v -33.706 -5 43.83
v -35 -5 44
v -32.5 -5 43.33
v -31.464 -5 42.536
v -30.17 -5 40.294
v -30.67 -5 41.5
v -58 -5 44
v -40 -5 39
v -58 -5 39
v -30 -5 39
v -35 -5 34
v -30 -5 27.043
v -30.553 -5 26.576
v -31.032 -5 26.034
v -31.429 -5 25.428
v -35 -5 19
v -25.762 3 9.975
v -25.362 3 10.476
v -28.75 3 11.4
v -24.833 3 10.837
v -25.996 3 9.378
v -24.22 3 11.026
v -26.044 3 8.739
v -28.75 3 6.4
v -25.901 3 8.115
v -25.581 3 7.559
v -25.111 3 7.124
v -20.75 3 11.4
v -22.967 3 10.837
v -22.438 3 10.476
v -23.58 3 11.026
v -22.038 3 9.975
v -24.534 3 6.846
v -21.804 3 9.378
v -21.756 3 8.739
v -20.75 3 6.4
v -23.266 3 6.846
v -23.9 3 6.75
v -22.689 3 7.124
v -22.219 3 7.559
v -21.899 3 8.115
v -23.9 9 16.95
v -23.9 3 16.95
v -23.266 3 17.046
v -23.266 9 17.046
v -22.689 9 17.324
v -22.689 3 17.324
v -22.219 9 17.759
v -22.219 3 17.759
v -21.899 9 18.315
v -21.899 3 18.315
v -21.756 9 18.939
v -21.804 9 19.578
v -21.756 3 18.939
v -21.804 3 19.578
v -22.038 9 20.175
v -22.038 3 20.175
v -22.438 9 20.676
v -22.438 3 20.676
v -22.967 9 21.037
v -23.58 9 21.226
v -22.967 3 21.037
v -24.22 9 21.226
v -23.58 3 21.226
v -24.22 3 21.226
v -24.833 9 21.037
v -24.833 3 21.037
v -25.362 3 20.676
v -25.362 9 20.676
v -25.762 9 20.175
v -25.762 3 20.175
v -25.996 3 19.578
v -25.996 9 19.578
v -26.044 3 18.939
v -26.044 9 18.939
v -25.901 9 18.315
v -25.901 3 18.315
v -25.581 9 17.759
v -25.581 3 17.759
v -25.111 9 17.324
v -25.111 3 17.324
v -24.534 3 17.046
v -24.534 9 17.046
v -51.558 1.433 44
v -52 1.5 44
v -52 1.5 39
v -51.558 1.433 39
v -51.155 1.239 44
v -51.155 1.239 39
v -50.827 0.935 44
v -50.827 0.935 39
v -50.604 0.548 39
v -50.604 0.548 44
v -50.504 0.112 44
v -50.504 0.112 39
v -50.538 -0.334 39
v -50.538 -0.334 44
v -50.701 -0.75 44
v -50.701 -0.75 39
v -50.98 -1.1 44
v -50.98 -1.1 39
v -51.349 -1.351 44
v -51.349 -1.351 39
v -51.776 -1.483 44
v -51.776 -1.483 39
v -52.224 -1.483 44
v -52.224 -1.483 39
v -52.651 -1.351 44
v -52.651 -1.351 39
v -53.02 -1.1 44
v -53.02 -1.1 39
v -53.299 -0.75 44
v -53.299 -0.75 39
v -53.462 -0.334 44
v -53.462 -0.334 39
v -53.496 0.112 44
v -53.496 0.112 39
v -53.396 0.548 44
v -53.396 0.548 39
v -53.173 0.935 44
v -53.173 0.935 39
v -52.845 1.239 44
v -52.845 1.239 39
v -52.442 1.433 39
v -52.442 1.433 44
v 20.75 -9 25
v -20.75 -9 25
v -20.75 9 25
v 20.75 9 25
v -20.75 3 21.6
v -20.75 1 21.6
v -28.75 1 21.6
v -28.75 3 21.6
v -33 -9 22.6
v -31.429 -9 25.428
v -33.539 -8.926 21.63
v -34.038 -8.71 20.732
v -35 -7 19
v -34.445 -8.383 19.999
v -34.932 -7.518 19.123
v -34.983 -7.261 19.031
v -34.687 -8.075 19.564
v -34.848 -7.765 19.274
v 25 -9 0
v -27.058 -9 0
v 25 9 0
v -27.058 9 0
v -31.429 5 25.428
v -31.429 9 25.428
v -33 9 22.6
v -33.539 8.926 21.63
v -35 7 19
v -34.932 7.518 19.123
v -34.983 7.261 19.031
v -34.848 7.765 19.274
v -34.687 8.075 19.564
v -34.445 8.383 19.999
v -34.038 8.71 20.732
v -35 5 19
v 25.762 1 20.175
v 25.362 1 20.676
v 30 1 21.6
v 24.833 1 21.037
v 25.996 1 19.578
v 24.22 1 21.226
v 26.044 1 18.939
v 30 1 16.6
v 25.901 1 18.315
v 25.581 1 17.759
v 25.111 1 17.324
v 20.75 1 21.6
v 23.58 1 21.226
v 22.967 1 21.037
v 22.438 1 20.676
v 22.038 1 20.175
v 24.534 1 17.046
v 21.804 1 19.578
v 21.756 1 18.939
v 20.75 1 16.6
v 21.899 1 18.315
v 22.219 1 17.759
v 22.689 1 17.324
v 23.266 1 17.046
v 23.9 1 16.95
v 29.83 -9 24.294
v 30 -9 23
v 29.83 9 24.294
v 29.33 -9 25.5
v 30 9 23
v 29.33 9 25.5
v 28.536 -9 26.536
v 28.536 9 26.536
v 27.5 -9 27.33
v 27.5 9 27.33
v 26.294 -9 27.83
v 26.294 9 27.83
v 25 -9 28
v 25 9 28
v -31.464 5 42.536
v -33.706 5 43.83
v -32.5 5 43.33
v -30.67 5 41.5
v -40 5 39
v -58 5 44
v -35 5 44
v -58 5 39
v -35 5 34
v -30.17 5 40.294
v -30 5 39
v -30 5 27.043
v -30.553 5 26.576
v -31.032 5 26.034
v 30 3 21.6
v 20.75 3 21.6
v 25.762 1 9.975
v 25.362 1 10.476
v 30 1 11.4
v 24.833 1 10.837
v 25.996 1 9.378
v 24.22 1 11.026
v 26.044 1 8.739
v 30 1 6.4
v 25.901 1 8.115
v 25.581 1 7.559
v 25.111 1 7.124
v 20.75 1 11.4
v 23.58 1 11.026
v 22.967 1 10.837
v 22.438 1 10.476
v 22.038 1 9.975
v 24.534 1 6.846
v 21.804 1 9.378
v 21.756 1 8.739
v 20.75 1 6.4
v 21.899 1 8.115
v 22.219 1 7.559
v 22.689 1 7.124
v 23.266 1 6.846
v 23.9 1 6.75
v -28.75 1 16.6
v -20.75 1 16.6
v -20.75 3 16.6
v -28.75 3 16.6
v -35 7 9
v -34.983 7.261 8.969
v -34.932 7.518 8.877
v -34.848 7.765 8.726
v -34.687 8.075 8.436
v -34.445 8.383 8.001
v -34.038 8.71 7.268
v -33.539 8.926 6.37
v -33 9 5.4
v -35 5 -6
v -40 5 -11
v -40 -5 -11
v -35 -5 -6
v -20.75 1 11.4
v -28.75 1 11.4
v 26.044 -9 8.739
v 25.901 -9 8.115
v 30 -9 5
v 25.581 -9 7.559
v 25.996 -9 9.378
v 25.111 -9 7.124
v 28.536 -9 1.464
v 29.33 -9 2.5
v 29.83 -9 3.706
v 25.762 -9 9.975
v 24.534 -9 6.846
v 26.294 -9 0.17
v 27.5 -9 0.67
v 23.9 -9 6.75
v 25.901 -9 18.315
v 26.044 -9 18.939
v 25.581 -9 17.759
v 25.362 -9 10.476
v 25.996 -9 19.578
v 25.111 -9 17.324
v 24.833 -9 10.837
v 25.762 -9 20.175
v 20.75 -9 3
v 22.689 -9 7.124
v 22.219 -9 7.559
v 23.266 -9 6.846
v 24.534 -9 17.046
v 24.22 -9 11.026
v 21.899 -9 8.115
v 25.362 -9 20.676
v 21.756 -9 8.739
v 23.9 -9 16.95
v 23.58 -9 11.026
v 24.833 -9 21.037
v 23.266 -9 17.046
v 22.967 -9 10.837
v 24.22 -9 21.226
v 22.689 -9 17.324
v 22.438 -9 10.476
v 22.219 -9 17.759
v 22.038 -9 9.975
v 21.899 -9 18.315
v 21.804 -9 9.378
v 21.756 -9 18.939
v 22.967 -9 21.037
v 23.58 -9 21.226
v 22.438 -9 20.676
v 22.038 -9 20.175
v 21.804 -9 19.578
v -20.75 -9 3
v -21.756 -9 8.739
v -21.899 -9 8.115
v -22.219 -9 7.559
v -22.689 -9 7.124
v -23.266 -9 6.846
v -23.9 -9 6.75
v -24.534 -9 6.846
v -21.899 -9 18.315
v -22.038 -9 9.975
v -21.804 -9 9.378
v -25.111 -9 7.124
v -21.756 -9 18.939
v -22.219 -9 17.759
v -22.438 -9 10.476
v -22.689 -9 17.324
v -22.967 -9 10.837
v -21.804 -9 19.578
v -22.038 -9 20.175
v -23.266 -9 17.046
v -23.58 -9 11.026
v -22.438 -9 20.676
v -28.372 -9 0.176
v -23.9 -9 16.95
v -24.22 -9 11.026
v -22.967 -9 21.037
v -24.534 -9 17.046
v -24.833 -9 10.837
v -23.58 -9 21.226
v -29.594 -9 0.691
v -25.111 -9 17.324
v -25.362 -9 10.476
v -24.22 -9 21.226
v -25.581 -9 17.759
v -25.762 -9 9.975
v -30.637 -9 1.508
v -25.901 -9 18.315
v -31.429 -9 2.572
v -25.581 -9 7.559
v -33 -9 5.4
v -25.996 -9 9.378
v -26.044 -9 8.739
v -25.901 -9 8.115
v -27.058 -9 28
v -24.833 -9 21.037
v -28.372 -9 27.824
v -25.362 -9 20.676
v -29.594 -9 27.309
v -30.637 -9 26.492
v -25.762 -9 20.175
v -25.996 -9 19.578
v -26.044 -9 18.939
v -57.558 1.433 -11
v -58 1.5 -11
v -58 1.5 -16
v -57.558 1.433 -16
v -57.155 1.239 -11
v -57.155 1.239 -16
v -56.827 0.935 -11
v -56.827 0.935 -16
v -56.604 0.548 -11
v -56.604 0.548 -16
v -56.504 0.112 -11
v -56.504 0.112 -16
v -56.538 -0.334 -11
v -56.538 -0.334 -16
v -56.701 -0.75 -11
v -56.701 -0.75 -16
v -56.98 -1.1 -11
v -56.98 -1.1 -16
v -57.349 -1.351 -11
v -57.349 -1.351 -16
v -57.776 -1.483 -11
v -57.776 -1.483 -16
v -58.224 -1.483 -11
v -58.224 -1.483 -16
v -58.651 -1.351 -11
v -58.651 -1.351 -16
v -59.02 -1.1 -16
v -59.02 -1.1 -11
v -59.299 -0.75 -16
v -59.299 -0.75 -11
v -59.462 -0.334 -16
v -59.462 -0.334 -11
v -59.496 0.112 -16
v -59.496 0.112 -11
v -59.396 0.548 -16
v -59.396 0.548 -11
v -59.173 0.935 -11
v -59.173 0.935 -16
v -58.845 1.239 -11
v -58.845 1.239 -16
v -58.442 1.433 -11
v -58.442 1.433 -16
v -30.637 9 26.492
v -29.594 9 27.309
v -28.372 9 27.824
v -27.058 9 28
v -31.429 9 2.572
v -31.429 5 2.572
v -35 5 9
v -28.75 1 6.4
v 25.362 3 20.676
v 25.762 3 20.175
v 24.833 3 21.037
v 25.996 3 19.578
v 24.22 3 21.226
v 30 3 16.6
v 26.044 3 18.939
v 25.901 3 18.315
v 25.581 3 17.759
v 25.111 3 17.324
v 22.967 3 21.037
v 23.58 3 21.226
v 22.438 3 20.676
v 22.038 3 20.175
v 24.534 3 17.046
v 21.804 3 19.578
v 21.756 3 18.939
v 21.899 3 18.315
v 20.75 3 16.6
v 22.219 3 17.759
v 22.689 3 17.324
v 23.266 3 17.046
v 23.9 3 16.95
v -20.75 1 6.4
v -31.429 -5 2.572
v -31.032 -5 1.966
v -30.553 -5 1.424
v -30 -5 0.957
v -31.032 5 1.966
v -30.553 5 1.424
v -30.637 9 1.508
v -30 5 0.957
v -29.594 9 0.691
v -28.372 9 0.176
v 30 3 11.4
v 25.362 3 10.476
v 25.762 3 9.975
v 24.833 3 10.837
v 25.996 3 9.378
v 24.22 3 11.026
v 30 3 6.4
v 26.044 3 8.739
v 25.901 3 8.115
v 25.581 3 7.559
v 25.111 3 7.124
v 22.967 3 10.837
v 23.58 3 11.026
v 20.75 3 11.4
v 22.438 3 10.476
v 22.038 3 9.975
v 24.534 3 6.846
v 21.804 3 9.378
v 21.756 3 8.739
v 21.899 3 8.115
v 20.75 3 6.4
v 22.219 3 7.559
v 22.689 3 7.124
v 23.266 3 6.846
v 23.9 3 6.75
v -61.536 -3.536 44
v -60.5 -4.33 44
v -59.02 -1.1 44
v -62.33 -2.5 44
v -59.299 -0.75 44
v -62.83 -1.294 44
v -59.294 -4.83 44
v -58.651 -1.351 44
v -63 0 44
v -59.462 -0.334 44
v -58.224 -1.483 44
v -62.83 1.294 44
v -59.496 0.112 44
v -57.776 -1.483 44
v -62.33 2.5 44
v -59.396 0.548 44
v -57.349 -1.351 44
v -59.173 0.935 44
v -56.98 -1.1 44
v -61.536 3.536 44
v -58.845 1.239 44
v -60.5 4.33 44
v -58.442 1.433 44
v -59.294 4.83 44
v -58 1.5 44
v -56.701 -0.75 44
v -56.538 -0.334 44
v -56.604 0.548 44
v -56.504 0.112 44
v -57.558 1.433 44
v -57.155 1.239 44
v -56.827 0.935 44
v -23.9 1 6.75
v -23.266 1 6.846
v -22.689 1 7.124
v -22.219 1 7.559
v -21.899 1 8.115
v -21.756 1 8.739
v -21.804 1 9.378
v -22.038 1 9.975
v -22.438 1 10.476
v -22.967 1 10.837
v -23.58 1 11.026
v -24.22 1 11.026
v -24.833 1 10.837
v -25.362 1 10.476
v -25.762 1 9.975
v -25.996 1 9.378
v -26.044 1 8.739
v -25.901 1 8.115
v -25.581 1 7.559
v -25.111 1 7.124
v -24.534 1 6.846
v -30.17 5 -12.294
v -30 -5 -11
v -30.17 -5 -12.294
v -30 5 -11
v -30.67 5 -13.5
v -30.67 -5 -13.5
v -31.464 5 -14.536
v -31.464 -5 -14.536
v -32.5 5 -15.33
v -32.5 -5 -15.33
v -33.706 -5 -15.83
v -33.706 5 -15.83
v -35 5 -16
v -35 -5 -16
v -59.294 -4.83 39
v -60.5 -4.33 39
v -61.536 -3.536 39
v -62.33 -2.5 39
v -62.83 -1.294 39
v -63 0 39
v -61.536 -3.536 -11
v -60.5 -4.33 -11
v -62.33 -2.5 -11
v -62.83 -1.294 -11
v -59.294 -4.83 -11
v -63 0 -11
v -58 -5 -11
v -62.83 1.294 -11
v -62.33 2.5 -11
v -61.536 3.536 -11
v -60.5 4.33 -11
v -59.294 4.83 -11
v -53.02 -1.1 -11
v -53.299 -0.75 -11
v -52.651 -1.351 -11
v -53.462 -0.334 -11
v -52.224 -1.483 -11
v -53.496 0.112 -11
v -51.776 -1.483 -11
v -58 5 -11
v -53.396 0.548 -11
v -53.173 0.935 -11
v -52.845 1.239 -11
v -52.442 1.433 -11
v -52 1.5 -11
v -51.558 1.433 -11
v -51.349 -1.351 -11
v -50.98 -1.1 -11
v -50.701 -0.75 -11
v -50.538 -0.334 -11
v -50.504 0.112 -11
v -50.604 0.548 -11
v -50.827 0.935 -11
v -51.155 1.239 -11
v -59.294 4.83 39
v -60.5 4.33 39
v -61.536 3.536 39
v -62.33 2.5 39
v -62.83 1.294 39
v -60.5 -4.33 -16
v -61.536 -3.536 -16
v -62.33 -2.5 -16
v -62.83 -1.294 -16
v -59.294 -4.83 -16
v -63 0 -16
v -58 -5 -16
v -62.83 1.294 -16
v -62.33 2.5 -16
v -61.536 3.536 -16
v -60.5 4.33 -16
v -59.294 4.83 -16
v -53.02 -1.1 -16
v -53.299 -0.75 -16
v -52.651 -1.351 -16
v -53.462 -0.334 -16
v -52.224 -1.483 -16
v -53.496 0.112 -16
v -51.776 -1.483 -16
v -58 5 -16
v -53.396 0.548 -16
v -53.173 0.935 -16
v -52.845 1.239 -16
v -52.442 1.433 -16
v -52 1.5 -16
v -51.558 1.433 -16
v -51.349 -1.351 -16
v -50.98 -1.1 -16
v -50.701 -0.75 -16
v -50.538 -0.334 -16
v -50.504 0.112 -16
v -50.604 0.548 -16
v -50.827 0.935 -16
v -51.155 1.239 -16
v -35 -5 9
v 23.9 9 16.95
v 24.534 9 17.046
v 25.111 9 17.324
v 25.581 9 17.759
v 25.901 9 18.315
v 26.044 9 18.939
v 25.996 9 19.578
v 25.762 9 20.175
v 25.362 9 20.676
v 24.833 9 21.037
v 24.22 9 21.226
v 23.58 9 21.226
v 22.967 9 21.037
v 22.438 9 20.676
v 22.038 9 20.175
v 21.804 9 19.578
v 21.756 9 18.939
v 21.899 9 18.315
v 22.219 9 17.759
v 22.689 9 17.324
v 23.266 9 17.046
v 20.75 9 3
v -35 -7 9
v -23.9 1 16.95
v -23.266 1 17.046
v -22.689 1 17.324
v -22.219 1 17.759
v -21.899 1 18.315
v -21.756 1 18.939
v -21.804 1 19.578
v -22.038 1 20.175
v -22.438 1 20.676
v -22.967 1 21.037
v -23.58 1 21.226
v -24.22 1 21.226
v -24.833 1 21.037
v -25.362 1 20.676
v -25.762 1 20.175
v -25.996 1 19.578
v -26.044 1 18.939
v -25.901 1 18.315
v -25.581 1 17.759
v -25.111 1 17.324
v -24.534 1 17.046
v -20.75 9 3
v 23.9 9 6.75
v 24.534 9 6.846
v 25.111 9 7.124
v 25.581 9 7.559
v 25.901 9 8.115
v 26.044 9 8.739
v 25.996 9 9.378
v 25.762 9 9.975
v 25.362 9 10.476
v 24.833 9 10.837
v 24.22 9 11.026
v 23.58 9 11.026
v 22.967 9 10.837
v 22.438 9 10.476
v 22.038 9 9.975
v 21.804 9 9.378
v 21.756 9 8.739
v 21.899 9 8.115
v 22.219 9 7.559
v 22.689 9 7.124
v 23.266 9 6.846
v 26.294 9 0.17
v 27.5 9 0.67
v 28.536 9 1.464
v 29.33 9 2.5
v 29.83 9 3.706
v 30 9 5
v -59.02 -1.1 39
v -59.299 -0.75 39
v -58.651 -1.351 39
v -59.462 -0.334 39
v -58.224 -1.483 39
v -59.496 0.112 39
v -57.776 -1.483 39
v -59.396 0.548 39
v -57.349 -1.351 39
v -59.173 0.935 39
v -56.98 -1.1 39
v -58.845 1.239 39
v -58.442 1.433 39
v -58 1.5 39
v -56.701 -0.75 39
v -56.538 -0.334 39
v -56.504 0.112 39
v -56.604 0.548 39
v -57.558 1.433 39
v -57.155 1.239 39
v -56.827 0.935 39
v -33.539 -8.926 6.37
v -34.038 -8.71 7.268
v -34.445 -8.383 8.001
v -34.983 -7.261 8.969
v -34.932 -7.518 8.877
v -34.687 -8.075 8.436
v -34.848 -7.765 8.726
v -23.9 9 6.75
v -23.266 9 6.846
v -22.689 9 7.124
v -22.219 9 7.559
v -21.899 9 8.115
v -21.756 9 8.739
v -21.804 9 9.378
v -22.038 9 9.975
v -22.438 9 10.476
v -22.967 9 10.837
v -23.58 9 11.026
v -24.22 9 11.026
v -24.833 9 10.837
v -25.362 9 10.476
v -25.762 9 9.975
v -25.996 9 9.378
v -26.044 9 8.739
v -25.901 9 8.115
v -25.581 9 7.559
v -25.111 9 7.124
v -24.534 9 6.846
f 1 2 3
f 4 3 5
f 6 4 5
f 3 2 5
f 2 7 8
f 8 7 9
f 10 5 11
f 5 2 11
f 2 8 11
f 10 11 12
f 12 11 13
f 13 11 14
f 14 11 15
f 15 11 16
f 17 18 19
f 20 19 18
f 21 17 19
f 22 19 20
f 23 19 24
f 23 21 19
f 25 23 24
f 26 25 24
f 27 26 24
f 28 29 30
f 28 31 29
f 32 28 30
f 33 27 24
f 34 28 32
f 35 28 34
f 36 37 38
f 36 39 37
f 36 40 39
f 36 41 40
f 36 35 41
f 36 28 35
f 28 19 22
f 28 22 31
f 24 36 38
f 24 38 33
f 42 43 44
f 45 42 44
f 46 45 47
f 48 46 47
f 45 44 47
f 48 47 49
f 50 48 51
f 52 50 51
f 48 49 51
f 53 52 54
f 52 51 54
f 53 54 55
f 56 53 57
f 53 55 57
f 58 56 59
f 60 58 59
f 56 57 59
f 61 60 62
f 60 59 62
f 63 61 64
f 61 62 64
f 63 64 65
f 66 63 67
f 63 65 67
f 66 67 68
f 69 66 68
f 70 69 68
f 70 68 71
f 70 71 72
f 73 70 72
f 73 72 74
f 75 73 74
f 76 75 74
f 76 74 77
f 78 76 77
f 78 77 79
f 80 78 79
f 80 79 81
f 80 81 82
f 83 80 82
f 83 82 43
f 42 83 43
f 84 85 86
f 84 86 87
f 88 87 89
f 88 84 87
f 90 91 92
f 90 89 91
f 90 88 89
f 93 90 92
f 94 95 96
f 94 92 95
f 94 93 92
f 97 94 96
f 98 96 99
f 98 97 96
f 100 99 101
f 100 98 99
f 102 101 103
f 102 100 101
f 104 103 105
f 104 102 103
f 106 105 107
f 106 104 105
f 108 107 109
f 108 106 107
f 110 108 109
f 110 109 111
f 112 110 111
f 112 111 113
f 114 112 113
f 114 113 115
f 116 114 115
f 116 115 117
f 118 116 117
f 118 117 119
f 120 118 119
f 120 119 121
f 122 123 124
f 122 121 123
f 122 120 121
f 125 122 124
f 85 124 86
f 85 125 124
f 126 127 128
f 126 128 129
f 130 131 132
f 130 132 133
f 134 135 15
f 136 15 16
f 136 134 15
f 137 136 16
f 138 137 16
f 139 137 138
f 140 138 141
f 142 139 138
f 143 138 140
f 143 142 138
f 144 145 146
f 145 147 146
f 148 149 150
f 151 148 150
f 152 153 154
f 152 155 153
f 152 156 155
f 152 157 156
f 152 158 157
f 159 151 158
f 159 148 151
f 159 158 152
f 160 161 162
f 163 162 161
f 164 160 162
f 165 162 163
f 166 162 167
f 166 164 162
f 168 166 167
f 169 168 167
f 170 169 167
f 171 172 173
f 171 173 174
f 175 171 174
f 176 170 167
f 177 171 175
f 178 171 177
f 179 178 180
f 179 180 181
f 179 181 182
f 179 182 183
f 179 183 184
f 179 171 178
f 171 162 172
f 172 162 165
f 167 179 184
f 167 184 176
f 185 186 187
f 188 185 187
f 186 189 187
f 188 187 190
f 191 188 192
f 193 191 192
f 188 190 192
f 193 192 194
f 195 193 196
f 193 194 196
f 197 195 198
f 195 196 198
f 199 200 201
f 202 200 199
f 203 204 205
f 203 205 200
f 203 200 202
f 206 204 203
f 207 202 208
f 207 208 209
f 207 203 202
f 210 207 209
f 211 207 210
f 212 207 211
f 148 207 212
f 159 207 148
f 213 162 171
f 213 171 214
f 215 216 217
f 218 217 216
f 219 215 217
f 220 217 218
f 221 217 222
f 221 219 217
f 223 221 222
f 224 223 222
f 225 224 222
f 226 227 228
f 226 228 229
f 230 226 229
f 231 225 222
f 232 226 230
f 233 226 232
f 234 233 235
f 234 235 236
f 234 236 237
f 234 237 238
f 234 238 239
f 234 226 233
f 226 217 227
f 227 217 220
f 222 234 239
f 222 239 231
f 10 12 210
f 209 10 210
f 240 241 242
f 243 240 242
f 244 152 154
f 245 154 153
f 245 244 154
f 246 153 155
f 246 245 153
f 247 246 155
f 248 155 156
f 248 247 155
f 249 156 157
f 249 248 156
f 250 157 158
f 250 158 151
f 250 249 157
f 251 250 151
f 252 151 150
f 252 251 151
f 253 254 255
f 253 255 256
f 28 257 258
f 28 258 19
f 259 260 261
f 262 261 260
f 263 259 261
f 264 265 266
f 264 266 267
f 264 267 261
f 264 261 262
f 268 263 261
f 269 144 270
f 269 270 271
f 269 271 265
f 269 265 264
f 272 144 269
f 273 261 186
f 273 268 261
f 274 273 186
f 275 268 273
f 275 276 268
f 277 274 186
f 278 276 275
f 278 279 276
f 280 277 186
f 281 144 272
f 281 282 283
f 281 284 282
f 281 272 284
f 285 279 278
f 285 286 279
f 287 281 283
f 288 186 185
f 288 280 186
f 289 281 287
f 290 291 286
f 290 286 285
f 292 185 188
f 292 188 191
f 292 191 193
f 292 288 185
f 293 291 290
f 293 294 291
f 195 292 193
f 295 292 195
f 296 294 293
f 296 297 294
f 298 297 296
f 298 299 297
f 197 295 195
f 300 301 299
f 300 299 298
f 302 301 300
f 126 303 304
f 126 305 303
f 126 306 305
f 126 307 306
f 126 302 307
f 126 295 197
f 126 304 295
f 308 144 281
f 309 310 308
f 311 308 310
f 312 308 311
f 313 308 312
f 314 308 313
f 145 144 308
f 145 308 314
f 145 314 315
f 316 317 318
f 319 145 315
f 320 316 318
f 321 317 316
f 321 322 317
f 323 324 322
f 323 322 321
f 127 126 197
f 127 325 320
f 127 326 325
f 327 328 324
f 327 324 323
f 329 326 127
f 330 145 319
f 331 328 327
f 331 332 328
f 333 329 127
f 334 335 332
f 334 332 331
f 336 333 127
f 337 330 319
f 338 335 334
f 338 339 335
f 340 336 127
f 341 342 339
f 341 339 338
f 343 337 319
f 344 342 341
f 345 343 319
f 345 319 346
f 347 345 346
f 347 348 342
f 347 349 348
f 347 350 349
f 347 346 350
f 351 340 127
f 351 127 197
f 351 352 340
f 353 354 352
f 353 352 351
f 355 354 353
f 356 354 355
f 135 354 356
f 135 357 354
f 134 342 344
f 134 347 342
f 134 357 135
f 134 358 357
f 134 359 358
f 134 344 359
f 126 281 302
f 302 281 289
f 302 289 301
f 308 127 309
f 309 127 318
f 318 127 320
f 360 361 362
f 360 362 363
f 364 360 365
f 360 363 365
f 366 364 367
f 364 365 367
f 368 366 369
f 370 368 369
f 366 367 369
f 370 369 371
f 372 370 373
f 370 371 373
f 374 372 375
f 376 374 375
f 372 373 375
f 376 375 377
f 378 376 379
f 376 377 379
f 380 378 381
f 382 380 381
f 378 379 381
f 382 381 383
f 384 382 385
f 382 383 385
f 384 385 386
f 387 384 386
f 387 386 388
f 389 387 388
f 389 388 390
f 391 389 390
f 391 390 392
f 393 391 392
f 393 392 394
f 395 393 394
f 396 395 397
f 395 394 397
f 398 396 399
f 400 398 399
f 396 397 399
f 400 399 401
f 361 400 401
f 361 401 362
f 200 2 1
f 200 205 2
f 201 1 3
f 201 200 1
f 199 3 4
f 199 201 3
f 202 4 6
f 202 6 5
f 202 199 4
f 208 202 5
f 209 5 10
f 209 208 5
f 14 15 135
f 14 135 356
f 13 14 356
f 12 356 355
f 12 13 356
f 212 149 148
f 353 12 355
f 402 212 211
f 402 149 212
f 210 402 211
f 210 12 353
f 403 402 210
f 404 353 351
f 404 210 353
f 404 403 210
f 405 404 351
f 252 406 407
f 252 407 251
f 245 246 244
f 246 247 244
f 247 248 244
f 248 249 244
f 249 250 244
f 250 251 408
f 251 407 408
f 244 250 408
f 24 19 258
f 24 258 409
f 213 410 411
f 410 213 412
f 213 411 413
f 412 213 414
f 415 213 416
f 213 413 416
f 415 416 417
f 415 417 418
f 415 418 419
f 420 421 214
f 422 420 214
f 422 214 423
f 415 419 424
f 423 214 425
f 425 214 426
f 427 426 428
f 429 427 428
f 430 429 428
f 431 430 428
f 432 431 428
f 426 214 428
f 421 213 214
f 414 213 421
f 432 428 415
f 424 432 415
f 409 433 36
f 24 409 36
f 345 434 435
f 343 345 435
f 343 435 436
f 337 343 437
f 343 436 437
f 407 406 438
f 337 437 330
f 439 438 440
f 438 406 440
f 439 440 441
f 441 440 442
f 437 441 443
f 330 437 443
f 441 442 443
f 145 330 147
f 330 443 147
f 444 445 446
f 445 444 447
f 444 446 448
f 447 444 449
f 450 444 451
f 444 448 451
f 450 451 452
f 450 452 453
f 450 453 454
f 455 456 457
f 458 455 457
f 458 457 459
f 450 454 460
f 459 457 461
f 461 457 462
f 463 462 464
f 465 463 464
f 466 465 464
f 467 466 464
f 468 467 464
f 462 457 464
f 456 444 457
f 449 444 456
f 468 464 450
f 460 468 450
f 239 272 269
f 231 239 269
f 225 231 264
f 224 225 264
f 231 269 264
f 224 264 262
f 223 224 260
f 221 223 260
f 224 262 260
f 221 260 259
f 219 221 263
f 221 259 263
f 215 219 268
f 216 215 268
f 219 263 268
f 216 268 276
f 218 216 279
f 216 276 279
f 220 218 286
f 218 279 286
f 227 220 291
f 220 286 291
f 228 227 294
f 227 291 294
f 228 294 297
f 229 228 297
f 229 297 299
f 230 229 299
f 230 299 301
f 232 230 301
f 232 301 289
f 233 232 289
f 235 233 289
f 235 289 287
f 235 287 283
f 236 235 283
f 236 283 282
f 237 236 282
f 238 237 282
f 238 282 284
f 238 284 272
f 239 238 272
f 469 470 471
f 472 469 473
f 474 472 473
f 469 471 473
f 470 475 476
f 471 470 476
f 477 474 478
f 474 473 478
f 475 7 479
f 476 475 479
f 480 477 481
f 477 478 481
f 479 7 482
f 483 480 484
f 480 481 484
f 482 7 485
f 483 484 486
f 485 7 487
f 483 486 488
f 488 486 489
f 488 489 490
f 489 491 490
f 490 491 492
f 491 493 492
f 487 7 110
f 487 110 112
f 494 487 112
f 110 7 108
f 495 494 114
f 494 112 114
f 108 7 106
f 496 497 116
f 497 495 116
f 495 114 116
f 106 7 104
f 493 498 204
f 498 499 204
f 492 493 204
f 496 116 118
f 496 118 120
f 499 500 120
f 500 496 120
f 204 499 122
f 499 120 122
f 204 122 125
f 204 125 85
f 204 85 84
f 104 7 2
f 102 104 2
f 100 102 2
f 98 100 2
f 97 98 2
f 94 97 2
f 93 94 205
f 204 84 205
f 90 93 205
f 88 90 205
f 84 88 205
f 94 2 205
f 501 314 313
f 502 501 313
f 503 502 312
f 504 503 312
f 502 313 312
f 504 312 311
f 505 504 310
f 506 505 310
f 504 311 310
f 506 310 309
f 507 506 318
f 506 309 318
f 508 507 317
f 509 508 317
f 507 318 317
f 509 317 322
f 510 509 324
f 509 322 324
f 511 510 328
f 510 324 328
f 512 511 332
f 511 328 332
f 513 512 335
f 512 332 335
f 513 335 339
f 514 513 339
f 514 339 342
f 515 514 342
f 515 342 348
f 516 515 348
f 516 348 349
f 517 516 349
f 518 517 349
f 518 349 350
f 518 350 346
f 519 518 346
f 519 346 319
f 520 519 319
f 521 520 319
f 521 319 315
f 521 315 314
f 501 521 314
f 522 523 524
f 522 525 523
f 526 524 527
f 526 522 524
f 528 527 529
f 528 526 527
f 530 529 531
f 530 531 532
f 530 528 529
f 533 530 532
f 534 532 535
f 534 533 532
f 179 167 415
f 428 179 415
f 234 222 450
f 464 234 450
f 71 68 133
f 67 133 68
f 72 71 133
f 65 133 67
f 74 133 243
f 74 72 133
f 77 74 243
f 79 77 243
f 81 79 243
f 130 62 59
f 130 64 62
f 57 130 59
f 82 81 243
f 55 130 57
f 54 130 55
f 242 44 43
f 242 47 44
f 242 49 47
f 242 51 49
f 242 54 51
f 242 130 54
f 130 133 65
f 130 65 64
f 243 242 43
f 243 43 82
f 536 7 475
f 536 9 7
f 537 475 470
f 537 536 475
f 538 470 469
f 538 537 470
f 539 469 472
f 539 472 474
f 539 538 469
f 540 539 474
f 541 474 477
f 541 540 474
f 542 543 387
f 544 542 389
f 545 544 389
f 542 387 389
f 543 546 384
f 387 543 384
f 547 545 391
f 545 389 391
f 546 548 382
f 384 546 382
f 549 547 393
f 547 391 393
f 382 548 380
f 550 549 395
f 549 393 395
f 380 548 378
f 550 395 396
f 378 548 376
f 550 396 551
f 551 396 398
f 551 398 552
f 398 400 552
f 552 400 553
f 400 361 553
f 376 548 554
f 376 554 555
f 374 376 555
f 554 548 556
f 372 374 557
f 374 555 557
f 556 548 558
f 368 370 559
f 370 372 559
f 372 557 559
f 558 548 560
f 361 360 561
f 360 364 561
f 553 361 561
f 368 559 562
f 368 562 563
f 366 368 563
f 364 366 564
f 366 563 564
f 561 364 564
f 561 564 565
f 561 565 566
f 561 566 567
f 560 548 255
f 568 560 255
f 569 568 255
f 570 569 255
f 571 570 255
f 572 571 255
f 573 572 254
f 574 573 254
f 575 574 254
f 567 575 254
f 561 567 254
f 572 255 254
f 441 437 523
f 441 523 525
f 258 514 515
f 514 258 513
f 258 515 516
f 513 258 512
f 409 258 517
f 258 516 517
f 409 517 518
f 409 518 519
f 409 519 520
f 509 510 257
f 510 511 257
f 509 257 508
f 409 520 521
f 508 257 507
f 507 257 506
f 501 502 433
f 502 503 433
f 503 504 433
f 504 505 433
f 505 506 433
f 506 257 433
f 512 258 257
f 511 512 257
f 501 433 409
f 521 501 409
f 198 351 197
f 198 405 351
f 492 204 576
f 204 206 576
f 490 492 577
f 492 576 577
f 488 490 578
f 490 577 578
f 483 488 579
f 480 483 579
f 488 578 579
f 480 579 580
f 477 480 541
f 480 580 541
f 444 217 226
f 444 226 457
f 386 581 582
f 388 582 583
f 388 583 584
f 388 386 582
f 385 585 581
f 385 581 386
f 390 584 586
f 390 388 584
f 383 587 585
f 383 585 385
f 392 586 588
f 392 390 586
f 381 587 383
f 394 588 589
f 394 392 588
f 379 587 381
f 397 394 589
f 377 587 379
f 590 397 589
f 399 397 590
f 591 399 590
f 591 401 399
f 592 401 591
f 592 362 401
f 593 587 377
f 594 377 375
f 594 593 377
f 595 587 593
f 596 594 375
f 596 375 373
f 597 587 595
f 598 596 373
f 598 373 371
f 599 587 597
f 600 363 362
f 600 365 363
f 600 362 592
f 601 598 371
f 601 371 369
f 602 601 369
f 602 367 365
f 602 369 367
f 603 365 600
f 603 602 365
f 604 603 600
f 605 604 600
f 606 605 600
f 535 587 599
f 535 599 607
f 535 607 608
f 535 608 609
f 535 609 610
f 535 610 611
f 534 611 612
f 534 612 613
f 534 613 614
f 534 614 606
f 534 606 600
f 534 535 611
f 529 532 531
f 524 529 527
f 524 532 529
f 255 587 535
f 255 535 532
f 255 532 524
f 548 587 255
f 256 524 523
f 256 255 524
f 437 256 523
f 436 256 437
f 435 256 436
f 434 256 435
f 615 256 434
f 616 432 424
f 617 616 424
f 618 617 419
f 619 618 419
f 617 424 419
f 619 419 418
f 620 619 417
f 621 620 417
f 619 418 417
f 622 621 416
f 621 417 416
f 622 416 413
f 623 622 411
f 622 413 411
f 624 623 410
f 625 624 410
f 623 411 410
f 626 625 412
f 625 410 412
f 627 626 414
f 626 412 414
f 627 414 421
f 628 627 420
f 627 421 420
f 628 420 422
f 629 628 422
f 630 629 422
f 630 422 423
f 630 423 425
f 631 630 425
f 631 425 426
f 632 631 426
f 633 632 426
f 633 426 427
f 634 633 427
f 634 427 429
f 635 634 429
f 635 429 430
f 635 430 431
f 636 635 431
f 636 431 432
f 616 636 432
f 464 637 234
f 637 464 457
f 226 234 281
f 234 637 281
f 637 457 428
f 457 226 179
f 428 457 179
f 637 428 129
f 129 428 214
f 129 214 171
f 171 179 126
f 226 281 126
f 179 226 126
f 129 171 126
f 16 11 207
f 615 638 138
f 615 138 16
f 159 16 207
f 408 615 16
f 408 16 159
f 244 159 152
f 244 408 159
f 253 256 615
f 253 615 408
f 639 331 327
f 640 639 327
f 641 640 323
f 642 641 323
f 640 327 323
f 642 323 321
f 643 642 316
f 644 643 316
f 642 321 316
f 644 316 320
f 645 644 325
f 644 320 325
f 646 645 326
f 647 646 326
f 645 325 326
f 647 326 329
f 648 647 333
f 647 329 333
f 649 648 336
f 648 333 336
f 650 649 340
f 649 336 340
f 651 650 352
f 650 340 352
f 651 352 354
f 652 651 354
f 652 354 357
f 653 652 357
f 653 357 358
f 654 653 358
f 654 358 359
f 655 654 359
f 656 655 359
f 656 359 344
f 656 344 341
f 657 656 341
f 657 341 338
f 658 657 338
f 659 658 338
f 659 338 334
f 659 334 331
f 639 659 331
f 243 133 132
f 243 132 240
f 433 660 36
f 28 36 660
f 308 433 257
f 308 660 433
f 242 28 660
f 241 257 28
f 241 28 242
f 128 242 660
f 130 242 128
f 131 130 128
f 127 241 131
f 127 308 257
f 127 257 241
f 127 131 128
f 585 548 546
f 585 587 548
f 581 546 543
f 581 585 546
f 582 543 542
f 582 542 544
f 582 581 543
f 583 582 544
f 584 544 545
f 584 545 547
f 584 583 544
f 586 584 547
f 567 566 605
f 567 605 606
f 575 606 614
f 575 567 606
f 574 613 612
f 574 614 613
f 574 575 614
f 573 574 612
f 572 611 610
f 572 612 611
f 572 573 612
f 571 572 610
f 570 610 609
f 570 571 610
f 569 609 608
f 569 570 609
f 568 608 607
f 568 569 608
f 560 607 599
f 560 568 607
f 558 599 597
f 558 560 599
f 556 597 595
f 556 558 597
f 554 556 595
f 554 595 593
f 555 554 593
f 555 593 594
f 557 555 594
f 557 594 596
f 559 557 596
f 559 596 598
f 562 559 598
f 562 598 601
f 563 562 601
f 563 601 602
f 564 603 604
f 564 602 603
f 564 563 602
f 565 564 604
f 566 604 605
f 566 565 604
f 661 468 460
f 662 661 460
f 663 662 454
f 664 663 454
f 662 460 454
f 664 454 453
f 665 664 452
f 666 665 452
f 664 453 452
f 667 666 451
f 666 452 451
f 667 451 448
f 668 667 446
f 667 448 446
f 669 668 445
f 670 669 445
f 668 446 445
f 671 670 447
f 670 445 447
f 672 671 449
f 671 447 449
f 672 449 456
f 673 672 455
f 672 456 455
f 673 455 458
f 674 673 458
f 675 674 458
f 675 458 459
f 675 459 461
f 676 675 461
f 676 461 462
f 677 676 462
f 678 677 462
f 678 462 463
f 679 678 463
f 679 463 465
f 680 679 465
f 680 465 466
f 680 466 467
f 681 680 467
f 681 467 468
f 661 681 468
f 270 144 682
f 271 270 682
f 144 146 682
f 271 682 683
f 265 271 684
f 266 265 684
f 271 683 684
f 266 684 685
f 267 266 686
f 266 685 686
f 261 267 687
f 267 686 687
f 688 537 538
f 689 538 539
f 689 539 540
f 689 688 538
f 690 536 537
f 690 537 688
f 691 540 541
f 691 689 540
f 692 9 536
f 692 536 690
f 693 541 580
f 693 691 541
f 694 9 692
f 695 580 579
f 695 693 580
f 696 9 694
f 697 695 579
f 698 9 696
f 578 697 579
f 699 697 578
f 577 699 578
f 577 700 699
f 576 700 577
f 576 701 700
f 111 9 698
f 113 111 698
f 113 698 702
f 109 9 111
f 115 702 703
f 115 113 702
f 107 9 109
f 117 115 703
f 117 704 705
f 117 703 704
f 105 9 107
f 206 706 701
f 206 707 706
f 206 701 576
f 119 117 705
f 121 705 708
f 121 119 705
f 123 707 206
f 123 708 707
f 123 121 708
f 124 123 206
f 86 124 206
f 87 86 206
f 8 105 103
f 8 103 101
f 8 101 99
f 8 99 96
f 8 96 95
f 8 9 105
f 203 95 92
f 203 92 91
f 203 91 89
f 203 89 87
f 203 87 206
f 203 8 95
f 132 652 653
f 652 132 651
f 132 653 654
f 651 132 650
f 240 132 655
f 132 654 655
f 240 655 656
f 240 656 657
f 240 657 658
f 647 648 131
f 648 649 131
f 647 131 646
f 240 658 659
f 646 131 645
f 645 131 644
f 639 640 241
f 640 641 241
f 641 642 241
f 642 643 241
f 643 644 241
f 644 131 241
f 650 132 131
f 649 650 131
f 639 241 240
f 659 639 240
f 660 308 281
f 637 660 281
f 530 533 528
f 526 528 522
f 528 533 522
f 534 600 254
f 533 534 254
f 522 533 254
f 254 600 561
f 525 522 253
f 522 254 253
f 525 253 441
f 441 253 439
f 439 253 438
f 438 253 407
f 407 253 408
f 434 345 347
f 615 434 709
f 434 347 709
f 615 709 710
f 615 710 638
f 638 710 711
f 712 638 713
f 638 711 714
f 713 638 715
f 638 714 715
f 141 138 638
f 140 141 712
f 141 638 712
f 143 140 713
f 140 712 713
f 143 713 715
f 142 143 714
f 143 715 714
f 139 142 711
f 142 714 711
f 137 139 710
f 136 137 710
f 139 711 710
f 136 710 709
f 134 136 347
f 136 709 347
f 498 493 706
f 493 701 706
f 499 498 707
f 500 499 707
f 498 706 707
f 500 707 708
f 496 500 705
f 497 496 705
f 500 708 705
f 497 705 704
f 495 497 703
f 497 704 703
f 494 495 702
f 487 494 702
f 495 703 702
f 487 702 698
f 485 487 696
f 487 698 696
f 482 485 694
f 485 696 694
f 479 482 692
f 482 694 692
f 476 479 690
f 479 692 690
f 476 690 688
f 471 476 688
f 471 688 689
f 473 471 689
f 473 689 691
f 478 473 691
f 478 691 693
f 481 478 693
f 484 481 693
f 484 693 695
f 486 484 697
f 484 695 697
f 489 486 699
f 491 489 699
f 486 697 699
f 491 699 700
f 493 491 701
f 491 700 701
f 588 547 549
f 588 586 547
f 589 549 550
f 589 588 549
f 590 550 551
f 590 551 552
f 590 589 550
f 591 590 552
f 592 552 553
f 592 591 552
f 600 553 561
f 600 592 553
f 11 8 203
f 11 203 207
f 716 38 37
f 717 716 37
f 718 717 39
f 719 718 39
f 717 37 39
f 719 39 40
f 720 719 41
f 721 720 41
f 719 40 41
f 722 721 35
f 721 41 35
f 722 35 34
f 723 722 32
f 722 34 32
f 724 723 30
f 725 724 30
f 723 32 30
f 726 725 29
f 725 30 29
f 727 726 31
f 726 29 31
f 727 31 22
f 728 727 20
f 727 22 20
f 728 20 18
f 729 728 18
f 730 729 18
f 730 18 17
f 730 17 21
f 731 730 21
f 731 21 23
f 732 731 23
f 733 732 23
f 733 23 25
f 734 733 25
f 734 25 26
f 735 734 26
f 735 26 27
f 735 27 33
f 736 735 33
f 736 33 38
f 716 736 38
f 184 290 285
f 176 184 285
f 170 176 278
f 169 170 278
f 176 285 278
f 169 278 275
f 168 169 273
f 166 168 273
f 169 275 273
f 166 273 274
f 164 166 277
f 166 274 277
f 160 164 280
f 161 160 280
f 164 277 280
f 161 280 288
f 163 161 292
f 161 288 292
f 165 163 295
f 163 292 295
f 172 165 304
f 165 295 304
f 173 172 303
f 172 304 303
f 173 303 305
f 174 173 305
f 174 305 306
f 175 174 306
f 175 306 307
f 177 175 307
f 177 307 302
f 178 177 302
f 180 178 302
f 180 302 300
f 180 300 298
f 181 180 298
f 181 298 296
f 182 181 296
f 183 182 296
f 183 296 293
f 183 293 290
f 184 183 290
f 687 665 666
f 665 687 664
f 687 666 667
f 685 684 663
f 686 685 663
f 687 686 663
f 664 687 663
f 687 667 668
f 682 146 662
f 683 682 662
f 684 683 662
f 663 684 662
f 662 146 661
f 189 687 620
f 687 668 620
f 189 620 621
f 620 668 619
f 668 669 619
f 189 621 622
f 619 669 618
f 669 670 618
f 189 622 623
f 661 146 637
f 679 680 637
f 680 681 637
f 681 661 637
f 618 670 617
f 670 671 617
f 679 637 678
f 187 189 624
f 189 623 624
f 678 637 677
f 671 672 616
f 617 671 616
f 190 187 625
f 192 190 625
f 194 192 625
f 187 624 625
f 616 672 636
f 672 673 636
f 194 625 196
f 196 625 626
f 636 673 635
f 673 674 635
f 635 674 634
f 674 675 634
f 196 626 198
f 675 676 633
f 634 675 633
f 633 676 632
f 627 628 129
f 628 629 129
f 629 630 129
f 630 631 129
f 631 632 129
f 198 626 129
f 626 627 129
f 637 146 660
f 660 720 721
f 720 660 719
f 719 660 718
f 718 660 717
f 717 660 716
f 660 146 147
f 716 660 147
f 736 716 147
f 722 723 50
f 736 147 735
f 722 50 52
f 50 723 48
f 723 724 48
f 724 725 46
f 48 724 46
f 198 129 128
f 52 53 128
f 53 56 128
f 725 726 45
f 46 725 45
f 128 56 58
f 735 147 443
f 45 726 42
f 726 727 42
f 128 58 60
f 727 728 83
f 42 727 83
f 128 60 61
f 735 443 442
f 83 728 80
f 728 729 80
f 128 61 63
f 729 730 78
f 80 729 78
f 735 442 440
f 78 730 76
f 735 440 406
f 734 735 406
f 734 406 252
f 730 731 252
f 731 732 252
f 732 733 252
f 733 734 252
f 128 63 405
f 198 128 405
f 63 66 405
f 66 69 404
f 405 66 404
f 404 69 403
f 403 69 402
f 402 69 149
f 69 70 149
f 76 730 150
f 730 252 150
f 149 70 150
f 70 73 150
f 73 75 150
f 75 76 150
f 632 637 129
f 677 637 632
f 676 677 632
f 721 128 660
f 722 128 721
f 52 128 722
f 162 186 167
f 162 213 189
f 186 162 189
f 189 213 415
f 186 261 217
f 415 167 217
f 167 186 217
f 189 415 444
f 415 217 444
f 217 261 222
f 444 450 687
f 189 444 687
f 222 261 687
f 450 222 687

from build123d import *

# Parameters (mm, degrees)
ESQUISSE1_W                         = 60
ESQUISSE1_H                         = 18
BOSS_EXTRU_1_DEPTH                  = 28
ESQUISSE2_W                         = 41.5
ESQUISSE2_H                         = 22
ENL_V_MAT_EXTRU_1_DEPTH             = 30
ESQUISSE3_R                         = 2.15
ENL_V_MAT_EXTRU_2_DEPTH             = 30
ESQUISSE5_W                         = 10
ESQUISSE5_H                         = 60
BOSS_EXTRU_2_DEPTH                  = 5
ESQUISSE6_W                         = 10
ESQUISSE6_H                         = 5
BOSS_EXTRU_3_DEPTH                  = 28
ESQUISSE7_R                         = 1.5
ENL_V_MAT_EXTRU_4_DEPTH             = 92.394748208
NERVURE11_REACH                     = 77.186
ESQUISSE8_WALL_W                    = 162.668500034
ESQUISSE8_WALL_H                    = 18
CONG_5_R                            = 5
CONG_6_R                            = 5
NERVURE12_REACH                     = 73.169
ESQUISSE10_WALL_W                   = 151.408694602
ESQUISSE10_WALL_H                   = 10
CONG_7_R                            = 5
ESQUISSE12_W                        = 5
ESQUISSE12_H                        = 2
ENL_V_MAT_EXTRU_5_DEPTH             = 8
ENL_V_MAT_EXTRU_5_DIRECTION_2_REACH = 67.265
R_P_TITION_CIRCULAIRE1_COUNT        = 3
R_P_TITION_CIRCULAIRE1_ANGLE        = 180
ENL_V_MAT_EXTRU_8_DEPTH             = 79.064076245
ENL_V_MAT_EXTRU_8_DEPTH_BACK        = 79.064076245
CONG_8_R                            = 5
CONG_10_R                           = 5
CONG_12_R                           = 2
NERVURE13_REACH                     = 79.369
ESQUISSE22_WALL_W                   = 163.809556882
ESQUISSE22_WALL_H                   = 10
ENL_V_MAT_EXTRU_10_DEPTH            = 88.464278423
ENL_V_MAT_EXTRU_10_DEPTH_BACK       = 88.464278423
ESQUISSE24_R                        = 1.5


with BuildPart() as part:
    # Esquisse1 → Boss.-Extru.1 (new body)
    with BuildSketch(Plane.XY):
        Rectangle(ESQUISSE1_W, ESQUISSE1_H)
    extrude(amount=BOSS_EXTRU_1_DEPTH)

    # Esquisse2 → Enlèv. mat.-Extru.1 (cut)
    with BuildSketch(Plane.XZ.offset(9)):
        with Locations((0, 14)):
            Rectangle(ESQUISSE2_W, ESQUISSE2_H)
    extrude(amount=-ENL_V_MAT_EXTRU_1_DEPTH, mode=Mode.SUBTRACT)

    # Esquisse3 → Enlèv. mat.-Extru.2 (cut)
    with BuildSketch(Plane(origin=(0, -9, 0), x_dir=(-1, 0, 0), z_dir=(0, -1, 0))):
        with Locations(Location((23.9, -19.1, 0), (0, 0, 90))):
            Circle(ESQUISSE3_R)
        with Locations(Location((23.9, -8.9, 0), (0, 0, 90))):
            Circle(ESQUISSE3_R)
        with Locations(Location((-23.9, -8.9, 0), (0, 0, 90))):
            Circle(ESQUISSE3_R)
        with Locations(Location((-23.9, -19.1, 0), (0, 0, 90))):
            Circle(ESQUISSE3_R)
    extrude(amount=-ENL_V_MAT_EXTRU_2_DEPTH, mode=Mode.SUBTRACT)

    # Esquisse5 → Boss.-Extru.2 (add)
    with BuildSketch(Plane.ZY.offset(30)):
        with Locations((14, 0)):
            Rectangle(ESQUISSE5_W, ESQUISSE5_H)
    boss_extru_2 = extrude(amount=BOSS_EXTRU_2_DEPTH)

    # Esquisse6 → Boss.-Extru.3 (add)
    with BuildSketch(Plane.ZY.offset(35)):
        with Locations((14, 27.5)):
            Rectangle(ESQUISSE6_W, ESQUISSE6_H)
        with Locations((14, -27.5)):
            Rectangle(ESQUISSE6_W, ESQUISSE6_H)
    boss_extru_3 = extrude(amount=BOSS_EXTRU_3_DEPTH)

    # Esquisse7 → Enlèv. mat.-Extru.4 (cut, symmetric)
    with BuildSketch(Plane(origin=(0, 30, 0), x_dir=(1, 0, 0), z_dir=(0, 1, 0))):
        with Locations(Location((-58, -14, 0), (0, 0, 270))):
            Circle(ESQUISSE7_R)
    enl_v_mat_extru_4 = extrude(amount=ENL_V_MAT_EXTRU_4_DEPTH, both=True, mode=Mode.SUBTRACT)

    # Esquisse8 wall → Nervure11 (add, up to next)
    with BuildSketch(Plane(origin=(-32.5, 0, 23.5), x_dir=(-0.485642931179, 0, -0.874157276122), z_dir=(-0.874157276122, 0, 0.485642931179)), mode=Mode.PRIVATE) as nervure11_sk1:
        Rectangle(ESQUISSE8_WALL_W, ESQUISSE8_WALL_H)
    nervure11_tool1 = extrude(nervure11_sk1.sketch, amount=-NERVURE11_REACH, mode=Mode.PRIVATE) - part.part
    nervure11 = nervure11_tool1.solids().sort_by_distance((-32.5, 0, 23.5))[0]
    add(nervure11)

    # Symétrie1: Nervure11 across plane
    add(nervure11.mirror(Plane.XY.offset(14)))

    # Congé5
    cong_5_edges = [part.edges().sort_by_distance(p)[0] for p in [
        (-30, 0, 28),
        (30, 0, 28),
        (-30, 0, 0),
        (30, 0, 0),
    ]]
    fillet(cong_5_edges, radius=CONG_5_R)

    # Congé6
    cong_6_edges = [part.edges().sort_by_distance(p)[0] for p in [
        (-30, 30, 14),
        (-30, -30, 14),
    ]]
    fillet(cong_6_edges, radius=CONG_6_R)

    # Esquisse10 wall → Nervure12 (add, up to next)
    with BuildSketch(Plane(origin=(-37.5, 22.5, 14), x_dir=(0.707106781187, -0.707106781187, 0), z_dir=(0.707106781187, 0.707106781187, 0)), mode=Mode.PRIVATE) as nervure12_sk1:
        Rectangle(ESQUISSE10_WALL_W, ESQUISSE10_WALL_H)
    nervure12_tool1 = extrude(nervure12_sk1.sketch, amount=NERVURE12_REACH, mode=Mode.PRIVATE) - part.part
    nervure12 = nervure12_tool1.solids().sort_by_distance((-37.5, 22.5, 14))[0]
    add(nervure12)

    # Symétrie2: Nervure12 across plane
    add(nervure12.mirror(Plane.ZX))

    # Congé7
    cong_7_edges = [part.edges().sort_by_distance(p)[0] for p in [
        (-63, -27.5, 9),
        (-63, -27.5, 19),
        (-63, 27.5, 9),
        (-63, 27.5, 19),
    ]]
    fillet(cong_7_edges, radius=CONG_7_R - 0.0001)  # a hair under: the kernel refuses the full size

    # Esquisse12 → Enlèv. mat.-Extru.5 (cut)
    with BuildSketch(Plane(origin=(-20.75, 0, 0), x_dir=(0, 0, -1), z_dir=(1, 0, 0))):
        with Locations((-19.1, 2)):
            Rectangle(ESQUISSE12_W, ESQUISSE12_H)
        with Locations((-8.9, 2)):
            Rectangle(ESQUISSE12_W, ESQUISSE12_H)
    extrude(amount=-ENL_V_MAT_EXTRU_5_DEPTH, mode=Mode.SUBTRACT)

    # Esquisse12 → Enlèv. mat.-Extru.5 direction 2 (cut, up to next)
    with BuildSketch(Plane(origin=(-20.75, 0, 0), x_dir=(0, 0, -1), z_dir=(1, 0, 0)), mode=Mode.PRIVATE) as enl_v_mat_extru_5_direction_2_sk1:
        with Locations((-19.1, 2)):
            Rectangle(ESQUISSE12_W, ESQUISSE12_H)
    enl_v_mat_extru_5_direction_2_tool1 = extrude(enl_v_mat_extru_5_direction_2_sk1.sketch, amount=ENL_V_MAT_EXTRU_5_DIRECTION_2_REACH, mode=Mode.PRIVATE) & part.part
    # Esquisse12 → Enlèv. mat.-Extru.5 direction 2 (cut, up to next)
    with BuildSketch(Plane(origin=(-20.75, 0, 0), x_dir=(0, 0, -1), z_dir=(1, 0, 0)), mode=Mode.PRIVATE) as enl_v_mat_extru_5_direction_2_sk2:
        with Locations((-8.9, 2)):
            Rectangle(ESQUISSE12_W, ESQUISSE12_H)
    enl_v_mat_extru_5_direction_2_tool2 = extrude(enl_v_mat_extru_5_direction_2_sk2.sketch, amount=ENL_V_MAT_EXTRU_5_DIRECTION_2_REACH, mode=Mode.PRIVATE) & part.part
    add(enl_v_mat_extru_5_direction_2_tool1.solids().sort_by_distance((-20.75, 2, 19.1))[0], mode=Mode.SUBTRACT)
    add(enl_v_mat_extru_5_direction_2_tool2.solids().sort_by_distance((-20.75, 2, 8.9))[0], mode=Mode.SUBTRACT)

    # Répétition circulaire1: Boss.-Extru.2, Boss.-Extru.3, Enlèv. mat.-Extru.4 ×3 about axis
    r_p_tition_circulaire1_axis = Axis((-35, 0, 14), (-1, 0, 0))
    add([boss_extru_2.rotate(r_p_tition_circulaire1_axis, i * R_P_TITION_CIRCULAIRE1_ANGLE / (R_P_TITION_CIRCULAIRE1_COUNT - 1)) for i in range(1, R_P_TITION_CIRCULAIRE1_COUNT)])
    add([boss_extru_3.rotate(r_p_tition_circulaire1_axis, i * R_P_TITION_CIRCULAIRE1_ANGLE / (R_P_TITION_CIRCULAIRE1_COUNT - 1)) for i in range(1, R_P_TITION_CIRCULAIRE1_COUNT)])
    add([enl_v_mat_extru_4.rotate(r_p_tition_circulaire1_axis, i * R_P_TITION_CIRCULAIRE1_ANGLE / (R_P_TITION_CIRCULAIRE1_COUNT - 1)) for i in range(1, R_P_TITION_CIRCULAIRE1_COUNT)], mode=Mode.SUBTRACT)

    # Esquisse21 → Enlèv. mat.-Extru.8 (cut, two sides: drawn at the far end of the back side and taken through both)
    with BuildSketch(Plane(origin=(0, 0, 9), x_dir=(-1, 0, 0), z_dir=(0, 0, -1)).offset(-ENL_V_MAT_EXTRU_8_DEPTH_BACK)):
        Polygon((63, -25), (40, -25), (35, -20), (35, -9), (30, -9), (30, -30), (63, -30), align=None)
        Polygon((35, 20), (40, 25), (63, 25), (63, 30), (30, 30), (30, 9), (35, 9), align=None)
    extrude(amount=ENL_V_MAT_EXTRU_8_DEPTH + ENL_V_MAT_EXTRU_8_DEPTH_BACK, mode=Mode.SUBTRACT)

    # Congé8
    cong_8_edges = [part.edges().sort_by_distance(p)[0] for p in [
        (-30, 0, 44),
        (-30, 0, -16),
    ]]
    fillet(cong_8_edges, radius=CONG_8_R)

    # Congé10
    cong_10_edges = [part.edges().sort_by_distance(p)[0] for p in [
        (-63, 5, -13.5),
        (-63, -5, -13.5),
        (-63, -5, 41.5),
        (-63, 5, 41.5),
    ]]
    fillet(cong_10_edges, radius=CONG_10_R - 0.0001)  # a hair under: the kernel refuses the full size

    # Congé12
    cong_12_edges = [part.edges().sort_by_distance(p)[0] for p in [
        (-35, -9, 14),
        (-35, 9, 14),
    ]]
    fillet(cong_12_edges, radius=CONG_12_R)

    # Esquisse22 wall → Nervure13 (add, up to next)
    with BuildSketch(Plane(origin=(-37.5, 0, -8.5), x_dir=(0.707106781187, 0, 0.707106781187), z_dir=(0.707106781187, 0, -0.707106781187)), mode=Mode.PRIVATE) as nervure13_sk1:
        Rectangle(ESQUISSE22_WALL_W, ESQUISSE22_WALL_H)
    nervure13_tool1 = extrude(nervure13_sk1.sketch, amount=NERVURE13_REACH, mode=Mode.PRIVATE) - part.part
    nervure13 = nervure13_tool1.solids().sort_by_distance((-37.5, 0, -8.5))[0]
    add(nervure13)

    # Symétrie3: Nervure13 across plane
    add(nervure13.mirror(Plane(origin=(0, 0, 14), x_dir=(1, 0, 0), z_dir=(0, 0, -1))))

    # Esquisse24 → Enlèv. mat.-Extru.10 (cut, two sides: drawn at the far end of the back side and taken through both)
    with BuildSketch(Plane(origin=(0, 0, -16), x_dir=(-1, 0, 0), z_dir=(0, 0, -1)).offset(-ENL_V_MAT_EXTRU_10_DEPTH_BACK)):
        with Locations(Location((52, 0, 0), (0, 0, 90))):
            Circle(ESQUISSE24_R)
    extrude(amount=ENL_V_MAT_EXTRU_10_DEPTH + ENL_V_MAT_EXTRU_10_DEPTH_BACK, mode=Mode.SUBTRACT)


solid = part.part
